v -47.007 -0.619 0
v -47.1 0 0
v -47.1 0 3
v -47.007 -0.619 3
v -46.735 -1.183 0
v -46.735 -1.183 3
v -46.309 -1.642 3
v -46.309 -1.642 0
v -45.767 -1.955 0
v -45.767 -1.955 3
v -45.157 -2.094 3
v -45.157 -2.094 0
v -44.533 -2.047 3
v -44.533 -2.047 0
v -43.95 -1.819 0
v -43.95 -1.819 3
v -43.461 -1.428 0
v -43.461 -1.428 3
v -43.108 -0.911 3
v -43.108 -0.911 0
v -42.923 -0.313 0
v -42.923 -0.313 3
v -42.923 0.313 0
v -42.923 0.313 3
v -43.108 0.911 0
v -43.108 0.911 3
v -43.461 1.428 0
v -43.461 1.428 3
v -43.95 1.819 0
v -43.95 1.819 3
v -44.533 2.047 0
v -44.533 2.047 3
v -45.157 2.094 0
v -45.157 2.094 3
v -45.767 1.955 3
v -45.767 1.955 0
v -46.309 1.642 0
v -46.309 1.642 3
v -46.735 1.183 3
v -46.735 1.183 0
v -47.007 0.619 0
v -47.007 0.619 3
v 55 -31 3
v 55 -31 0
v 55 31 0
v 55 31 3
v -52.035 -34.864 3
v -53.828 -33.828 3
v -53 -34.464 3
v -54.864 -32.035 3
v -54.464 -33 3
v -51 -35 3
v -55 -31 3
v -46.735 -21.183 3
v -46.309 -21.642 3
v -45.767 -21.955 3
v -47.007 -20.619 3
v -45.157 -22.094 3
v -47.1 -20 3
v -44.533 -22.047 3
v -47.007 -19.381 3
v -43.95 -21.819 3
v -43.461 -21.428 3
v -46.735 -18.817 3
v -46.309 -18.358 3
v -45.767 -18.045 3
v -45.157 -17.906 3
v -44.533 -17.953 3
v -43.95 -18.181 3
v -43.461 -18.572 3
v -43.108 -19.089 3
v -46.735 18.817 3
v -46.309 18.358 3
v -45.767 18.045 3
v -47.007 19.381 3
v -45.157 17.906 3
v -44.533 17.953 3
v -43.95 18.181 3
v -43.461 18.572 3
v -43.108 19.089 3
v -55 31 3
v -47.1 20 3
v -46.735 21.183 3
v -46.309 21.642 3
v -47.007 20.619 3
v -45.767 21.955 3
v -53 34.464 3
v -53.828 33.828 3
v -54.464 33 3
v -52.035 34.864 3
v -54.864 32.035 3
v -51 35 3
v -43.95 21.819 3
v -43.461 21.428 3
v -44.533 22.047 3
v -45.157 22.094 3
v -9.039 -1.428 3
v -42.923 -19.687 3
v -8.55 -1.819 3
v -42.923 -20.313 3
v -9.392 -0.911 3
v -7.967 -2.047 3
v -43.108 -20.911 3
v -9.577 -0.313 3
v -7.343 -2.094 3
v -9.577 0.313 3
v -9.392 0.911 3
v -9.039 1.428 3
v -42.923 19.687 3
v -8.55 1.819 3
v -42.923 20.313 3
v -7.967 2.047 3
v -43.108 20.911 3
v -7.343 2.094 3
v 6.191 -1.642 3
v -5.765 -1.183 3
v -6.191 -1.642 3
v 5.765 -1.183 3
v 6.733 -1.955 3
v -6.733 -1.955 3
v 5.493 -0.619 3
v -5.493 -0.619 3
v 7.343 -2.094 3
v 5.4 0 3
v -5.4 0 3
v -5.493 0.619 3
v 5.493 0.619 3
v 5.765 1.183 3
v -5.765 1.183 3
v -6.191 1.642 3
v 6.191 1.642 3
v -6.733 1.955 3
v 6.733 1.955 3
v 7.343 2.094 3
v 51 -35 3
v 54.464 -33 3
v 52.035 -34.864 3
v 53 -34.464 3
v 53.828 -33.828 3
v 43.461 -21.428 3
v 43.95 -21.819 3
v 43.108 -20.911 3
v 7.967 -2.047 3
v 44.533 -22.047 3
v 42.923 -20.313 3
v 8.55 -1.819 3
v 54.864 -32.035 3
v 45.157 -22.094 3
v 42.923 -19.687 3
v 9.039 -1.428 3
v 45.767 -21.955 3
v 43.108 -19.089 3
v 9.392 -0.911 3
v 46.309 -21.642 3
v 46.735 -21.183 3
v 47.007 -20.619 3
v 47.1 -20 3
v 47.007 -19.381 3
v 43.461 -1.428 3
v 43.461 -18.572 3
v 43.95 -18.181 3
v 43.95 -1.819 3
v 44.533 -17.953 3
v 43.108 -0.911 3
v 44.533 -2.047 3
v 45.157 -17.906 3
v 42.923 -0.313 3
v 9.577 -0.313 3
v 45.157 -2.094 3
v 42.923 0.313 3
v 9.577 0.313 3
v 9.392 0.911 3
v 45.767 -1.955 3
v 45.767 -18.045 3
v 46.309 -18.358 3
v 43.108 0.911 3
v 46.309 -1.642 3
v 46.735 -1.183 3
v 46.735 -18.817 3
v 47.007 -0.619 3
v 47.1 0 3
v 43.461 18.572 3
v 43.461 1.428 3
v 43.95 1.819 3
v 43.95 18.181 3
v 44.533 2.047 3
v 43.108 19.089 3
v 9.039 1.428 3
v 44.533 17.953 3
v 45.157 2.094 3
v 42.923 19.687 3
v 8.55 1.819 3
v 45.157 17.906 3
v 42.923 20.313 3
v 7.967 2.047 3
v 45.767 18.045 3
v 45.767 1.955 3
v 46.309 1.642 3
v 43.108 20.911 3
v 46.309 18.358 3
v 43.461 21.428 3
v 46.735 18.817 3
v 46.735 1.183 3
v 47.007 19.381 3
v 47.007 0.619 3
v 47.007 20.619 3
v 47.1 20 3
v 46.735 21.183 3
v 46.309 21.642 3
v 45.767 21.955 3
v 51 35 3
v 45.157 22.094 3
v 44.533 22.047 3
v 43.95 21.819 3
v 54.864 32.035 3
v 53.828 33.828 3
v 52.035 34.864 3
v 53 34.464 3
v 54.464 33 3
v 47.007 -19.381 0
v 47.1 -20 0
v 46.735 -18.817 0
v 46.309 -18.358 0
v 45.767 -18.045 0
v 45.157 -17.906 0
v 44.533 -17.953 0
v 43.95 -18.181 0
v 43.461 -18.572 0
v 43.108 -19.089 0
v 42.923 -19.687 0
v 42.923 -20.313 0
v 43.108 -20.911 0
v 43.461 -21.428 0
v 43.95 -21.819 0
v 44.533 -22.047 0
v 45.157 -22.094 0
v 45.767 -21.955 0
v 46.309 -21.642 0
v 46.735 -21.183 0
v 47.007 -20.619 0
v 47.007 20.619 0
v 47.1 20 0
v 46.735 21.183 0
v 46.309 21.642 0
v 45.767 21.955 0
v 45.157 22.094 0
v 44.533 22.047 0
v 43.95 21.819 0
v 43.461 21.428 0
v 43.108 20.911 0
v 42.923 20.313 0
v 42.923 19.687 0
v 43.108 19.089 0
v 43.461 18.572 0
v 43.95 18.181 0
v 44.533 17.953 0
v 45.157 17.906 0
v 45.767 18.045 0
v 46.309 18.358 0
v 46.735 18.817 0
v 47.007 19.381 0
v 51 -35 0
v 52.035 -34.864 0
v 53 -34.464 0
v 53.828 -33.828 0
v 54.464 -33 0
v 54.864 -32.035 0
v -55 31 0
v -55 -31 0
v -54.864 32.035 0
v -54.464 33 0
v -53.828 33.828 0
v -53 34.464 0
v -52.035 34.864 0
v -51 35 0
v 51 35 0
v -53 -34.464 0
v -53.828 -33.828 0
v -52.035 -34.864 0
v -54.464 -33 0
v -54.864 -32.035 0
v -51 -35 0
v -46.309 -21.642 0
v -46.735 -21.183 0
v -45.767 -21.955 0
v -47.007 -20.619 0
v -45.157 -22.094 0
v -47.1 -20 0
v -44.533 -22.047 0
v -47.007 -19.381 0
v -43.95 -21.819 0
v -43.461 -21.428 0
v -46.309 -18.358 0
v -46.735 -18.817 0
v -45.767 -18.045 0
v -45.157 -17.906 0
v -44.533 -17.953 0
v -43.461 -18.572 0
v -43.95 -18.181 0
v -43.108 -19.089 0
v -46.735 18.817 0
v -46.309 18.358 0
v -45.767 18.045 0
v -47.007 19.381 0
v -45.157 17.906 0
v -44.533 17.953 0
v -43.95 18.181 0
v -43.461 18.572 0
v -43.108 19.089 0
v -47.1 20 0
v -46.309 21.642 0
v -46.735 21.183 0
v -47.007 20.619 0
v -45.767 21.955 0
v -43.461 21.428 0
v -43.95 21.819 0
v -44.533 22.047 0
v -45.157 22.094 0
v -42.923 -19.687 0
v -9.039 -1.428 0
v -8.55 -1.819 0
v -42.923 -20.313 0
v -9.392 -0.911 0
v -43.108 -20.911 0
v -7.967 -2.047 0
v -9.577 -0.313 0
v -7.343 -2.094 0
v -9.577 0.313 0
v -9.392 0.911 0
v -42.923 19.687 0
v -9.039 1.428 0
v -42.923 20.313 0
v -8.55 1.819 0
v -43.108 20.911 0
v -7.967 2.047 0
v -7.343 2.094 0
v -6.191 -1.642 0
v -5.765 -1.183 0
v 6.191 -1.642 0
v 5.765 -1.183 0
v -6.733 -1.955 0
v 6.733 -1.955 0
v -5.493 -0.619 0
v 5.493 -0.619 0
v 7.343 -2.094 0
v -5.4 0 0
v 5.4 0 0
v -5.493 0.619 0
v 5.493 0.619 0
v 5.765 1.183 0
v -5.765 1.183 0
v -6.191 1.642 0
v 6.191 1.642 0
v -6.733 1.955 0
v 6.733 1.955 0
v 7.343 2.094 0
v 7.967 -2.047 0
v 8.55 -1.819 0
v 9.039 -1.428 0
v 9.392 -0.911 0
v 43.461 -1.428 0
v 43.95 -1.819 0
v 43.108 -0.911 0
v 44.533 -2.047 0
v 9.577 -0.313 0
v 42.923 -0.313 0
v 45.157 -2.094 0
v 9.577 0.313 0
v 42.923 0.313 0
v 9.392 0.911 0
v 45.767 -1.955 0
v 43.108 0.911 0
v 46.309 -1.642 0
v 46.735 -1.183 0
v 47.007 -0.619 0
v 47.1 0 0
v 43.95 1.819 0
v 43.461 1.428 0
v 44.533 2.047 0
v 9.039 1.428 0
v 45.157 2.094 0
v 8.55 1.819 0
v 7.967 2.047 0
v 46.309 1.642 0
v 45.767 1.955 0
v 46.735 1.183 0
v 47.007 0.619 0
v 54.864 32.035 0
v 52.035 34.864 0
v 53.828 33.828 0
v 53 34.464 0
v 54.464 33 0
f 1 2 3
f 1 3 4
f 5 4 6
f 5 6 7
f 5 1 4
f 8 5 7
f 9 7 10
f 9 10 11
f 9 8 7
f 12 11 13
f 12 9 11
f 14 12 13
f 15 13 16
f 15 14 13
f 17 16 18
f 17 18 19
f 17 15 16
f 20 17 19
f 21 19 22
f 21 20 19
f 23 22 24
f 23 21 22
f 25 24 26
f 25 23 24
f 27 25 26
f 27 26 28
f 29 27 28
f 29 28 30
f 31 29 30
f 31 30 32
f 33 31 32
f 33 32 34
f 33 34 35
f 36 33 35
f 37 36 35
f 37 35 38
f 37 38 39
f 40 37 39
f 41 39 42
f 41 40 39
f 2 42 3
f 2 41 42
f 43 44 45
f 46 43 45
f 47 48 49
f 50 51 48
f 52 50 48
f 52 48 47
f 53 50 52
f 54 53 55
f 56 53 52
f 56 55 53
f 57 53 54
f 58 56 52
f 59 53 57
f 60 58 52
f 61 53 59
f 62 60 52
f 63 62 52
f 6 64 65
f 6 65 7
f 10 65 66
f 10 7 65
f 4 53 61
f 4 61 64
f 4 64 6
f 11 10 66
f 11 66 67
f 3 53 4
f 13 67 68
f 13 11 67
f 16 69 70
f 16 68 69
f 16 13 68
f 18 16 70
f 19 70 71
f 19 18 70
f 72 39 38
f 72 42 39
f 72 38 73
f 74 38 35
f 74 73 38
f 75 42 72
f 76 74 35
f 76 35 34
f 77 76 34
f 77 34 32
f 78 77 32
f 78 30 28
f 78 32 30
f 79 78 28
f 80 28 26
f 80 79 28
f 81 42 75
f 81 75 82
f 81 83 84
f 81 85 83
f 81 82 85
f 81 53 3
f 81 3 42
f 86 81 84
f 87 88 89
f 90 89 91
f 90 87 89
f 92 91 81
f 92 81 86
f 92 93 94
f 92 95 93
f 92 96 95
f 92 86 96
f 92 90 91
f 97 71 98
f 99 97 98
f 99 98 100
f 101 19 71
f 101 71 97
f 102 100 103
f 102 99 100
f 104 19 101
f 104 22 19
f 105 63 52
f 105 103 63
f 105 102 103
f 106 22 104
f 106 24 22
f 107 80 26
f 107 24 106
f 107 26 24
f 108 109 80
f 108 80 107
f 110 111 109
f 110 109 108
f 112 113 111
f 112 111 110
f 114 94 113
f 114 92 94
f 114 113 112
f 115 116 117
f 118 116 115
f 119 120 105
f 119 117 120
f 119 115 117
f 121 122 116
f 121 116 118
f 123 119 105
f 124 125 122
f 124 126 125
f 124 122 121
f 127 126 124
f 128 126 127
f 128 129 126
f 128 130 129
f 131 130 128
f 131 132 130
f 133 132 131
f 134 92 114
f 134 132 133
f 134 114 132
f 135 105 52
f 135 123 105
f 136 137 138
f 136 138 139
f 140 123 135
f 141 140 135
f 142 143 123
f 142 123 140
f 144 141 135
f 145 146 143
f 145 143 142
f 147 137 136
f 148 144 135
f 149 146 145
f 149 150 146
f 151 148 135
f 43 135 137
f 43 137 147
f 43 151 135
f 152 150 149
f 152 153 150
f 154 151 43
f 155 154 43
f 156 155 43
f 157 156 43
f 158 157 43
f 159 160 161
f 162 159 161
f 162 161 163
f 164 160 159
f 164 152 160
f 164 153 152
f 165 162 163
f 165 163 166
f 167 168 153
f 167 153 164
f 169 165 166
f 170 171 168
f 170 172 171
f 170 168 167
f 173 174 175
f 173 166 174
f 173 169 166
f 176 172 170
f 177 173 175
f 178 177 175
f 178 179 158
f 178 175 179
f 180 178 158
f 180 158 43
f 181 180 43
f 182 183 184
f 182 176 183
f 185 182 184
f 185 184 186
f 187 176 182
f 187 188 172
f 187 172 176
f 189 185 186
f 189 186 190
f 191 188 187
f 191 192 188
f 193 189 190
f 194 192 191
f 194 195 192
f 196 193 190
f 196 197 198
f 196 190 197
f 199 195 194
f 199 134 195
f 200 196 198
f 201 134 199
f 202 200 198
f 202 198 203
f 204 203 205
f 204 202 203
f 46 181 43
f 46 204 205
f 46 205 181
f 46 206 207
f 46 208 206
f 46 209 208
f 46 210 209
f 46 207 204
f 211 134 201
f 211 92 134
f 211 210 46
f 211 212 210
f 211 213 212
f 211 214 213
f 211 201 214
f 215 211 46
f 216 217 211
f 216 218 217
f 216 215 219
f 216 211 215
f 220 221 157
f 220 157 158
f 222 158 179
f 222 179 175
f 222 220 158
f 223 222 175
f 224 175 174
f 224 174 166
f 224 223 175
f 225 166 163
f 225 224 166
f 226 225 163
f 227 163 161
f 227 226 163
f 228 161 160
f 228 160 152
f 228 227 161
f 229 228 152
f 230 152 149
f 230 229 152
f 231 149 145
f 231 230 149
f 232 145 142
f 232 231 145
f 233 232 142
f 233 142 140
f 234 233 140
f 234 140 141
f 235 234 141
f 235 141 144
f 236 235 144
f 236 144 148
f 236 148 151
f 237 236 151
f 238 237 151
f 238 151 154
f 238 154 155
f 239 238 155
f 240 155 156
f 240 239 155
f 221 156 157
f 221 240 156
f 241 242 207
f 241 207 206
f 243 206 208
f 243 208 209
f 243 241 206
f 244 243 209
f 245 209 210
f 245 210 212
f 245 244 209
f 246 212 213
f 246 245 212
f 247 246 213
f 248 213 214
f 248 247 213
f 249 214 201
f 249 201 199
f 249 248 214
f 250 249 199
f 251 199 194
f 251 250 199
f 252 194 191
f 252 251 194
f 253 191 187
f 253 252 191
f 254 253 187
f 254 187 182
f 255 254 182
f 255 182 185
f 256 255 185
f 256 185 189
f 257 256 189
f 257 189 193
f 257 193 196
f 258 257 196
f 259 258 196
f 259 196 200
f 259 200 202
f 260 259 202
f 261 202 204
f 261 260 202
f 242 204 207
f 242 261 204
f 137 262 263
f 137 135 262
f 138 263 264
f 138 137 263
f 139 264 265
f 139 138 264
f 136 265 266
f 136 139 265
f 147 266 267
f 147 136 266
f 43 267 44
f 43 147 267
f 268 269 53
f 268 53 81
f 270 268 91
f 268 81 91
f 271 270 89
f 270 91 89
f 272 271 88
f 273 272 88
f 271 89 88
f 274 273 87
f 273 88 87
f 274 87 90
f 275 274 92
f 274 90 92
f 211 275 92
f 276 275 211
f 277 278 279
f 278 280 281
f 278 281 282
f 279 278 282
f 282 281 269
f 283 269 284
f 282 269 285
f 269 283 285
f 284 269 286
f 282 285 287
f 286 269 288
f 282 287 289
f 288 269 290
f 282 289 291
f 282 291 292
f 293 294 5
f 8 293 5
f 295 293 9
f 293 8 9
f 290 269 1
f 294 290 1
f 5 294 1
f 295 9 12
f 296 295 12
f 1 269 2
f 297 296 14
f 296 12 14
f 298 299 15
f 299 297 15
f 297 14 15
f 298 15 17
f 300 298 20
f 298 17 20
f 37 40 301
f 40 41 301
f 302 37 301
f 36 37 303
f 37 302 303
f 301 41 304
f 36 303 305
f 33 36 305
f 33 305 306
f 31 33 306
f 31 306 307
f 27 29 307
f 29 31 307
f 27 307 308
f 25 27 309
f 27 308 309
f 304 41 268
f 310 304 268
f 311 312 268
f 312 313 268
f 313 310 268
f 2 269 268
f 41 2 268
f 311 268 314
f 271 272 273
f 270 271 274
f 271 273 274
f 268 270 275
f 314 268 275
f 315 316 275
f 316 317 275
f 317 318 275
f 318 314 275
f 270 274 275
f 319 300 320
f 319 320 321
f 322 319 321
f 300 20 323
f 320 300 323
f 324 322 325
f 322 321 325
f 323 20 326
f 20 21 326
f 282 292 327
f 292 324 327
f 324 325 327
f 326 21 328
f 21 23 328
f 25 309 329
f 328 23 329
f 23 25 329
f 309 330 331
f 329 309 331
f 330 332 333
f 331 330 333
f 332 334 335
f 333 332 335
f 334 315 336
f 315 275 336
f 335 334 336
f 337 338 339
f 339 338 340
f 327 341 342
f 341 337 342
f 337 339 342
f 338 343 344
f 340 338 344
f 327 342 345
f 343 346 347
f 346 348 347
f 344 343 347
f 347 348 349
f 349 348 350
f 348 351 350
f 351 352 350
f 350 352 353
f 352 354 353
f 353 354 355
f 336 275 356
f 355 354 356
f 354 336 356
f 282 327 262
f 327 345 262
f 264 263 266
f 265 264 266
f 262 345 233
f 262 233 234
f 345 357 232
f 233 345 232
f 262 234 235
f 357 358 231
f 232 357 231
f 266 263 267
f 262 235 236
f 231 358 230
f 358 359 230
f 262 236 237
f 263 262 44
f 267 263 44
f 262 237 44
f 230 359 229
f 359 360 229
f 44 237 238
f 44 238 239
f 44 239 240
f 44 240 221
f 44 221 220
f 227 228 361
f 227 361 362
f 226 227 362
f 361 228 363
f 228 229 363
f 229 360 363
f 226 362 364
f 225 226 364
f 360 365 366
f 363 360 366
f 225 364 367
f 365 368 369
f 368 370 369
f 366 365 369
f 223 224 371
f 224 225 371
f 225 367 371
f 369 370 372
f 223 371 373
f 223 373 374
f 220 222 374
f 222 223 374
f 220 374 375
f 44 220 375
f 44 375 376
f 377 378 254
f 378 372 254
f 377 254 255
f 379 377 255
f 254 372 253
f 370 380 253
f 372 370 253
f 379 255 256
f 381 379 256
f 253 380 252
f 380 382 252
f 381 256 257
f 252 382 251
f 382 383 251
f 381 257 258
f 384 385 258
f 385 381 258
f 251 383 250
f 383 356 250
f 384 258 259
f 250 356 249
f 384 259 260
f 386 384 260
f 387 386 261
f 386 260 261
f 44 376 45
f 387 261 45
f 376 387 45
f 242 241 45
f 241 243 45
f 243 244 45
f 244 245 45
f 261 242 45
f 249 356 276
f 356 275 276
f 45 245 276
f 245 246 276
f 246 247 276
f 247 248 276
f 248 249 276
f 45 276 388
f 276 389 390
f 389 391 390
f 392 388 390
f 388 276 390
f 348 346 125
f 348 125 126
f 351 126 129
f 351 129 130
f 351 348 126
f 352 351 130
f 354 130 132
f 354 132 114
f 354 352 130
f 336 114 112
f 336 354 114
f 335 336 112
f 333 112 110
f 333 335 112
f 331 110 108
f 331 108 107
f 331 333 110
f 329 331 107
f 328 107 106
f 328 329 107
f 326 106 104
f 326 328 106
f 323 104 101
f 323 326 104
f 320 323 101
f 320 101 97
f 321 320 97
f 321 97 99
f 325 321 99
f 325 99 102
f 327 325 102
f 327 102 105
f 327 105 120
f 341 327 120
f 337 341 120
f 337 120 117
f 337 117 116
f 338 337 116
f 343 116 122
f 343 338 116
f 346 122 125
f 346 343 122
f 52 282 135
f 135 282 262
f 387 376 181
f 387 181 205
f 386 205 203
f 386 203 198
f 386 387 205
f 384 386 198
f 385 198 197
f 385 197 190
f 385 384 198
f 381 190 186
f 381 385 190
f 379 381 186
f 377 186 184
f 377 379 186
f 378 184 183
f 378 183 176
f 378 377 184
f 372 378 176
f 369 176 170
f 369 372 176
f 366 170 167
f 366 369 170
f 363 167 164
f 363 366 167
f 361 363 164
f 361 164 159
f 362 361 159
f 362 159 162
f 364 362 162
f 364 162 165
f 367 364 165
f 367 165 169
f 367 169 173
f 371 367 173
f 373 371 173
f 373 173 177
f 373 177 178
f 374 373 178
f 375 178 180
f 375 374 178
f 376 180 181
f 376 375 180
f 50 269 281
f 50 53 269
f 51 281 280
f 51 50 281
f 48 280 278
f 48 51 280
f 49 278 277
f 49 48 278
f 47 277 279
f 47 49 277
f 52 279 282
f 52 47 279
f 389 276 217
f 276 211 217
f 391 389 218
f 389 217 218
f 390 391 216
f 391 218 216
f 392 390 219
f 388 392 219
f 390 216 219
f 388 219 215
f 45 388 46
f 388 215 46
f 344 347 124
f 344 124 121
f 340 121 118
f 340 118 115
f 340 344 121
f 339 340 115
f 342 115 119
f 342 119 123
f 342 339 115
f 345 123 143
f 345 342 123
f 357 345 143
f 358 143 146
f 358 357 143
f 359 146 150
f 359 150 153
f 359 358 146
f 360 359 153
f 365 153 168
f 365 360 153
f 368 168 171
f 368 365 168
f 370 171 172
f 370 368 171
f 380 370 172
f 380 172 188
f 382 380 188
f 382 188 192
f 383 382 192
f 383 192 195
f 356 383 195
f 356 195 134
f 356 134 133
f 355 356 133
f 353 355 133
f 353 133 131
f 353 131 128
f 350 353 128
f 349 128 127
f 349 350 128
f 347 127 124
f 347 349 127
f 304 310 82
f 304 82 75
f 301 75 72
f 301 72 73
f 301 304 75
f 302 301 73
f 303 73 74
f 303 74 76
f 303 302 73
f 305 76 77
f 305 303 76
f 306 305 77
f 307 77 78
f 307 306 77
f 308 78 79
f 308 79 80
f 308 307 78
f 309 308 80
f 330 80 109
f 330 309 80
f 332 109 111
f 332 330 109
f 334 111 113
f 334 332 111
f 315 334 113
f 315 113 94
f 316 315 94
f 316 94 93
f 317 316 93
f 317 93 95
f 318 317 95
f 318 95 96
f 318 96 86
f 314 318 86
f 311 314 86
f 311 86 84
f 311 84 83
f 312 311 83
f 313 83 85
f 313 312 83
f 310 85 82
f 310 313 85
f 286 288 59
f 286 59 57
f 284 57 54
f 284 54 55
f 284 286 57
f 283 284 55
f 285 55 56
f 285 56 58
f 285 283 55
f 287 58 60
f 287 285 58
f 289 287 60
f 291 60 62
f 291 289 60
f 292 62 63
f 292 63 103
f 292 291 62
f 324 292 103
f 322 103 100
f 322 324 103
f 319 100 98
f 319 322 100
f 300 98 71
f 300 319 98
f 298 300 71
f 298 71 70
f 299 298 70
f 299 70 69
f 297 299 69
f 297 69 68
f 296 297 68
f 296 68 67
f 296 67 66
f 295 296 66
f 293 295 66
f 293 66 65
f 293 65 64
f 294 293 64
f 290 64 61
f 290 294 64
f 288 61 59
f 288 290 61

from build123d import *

# Parameters (mm, degrees)
SKETCH_1_W      = 110
SKETCH_1_H      = 70
SKETCH_1_R      = 2.1
EXTRUDE_1_DEPTH = 3
FILLET_1_R      = 4


with BuildPart() as part:
    # 草图1 → 凸台-拉伸1 (new body)
    with BuildSketch(Plane.XY):
        Rectangle(SKETCH_1_W, SKETCH_1_H)
        with Locations((45, 20)):
            Circle(SKETCH_1_R, mode=Mode.SUBTRACT)
        with Locations((45, 0)):
            Circle(SKETCH_1_R, mode=Mode.SUBTRACT)
        with Locations((45, -20)):
            Circle(SKETCH_1_R, mode=Mode.SUBTRACT)
        with Locations(Location((-45, 20, 0), (0, 0, 180))):
            Circle(SKETCH_1_R, mode=Mode.SUBTRACT)
        with Locations(Location((-45, 0, 0), (0, 0, 180))):
            Circle(SKETCH_1_R, mode=Mode.SUBTRACT)
        with Locations(Location((-45, -20, 0), (0, 0, 180))):
            Circle(SKETCH_1_R, mode=Mode.SUBTRACT)
        with Locations((-7.5, 0)):
            Circle(SKETCH_1_R, mode=Mode.SUBTRACT)
        with Locations(Location((7.5, 0, 0), (0, 0, 180))):
            Circle(SKETCH_1_R, mode=Mode.SUBTRACT)
    extrude(amount=EXTRUDE_1_DEPTH)

    # 圆角1
    fillet_1_edges = [part.edges().sort_by_distance(p)[0] for p in [
        (55, -35, 1.5),
        (-55, -35, 1.5),
        (-55, 35, 1.5),
        (55, 35, 1.5),
    ]]
    fillet(fillet_1_edges, radius=FILLET_1_R)


solid = part.part
